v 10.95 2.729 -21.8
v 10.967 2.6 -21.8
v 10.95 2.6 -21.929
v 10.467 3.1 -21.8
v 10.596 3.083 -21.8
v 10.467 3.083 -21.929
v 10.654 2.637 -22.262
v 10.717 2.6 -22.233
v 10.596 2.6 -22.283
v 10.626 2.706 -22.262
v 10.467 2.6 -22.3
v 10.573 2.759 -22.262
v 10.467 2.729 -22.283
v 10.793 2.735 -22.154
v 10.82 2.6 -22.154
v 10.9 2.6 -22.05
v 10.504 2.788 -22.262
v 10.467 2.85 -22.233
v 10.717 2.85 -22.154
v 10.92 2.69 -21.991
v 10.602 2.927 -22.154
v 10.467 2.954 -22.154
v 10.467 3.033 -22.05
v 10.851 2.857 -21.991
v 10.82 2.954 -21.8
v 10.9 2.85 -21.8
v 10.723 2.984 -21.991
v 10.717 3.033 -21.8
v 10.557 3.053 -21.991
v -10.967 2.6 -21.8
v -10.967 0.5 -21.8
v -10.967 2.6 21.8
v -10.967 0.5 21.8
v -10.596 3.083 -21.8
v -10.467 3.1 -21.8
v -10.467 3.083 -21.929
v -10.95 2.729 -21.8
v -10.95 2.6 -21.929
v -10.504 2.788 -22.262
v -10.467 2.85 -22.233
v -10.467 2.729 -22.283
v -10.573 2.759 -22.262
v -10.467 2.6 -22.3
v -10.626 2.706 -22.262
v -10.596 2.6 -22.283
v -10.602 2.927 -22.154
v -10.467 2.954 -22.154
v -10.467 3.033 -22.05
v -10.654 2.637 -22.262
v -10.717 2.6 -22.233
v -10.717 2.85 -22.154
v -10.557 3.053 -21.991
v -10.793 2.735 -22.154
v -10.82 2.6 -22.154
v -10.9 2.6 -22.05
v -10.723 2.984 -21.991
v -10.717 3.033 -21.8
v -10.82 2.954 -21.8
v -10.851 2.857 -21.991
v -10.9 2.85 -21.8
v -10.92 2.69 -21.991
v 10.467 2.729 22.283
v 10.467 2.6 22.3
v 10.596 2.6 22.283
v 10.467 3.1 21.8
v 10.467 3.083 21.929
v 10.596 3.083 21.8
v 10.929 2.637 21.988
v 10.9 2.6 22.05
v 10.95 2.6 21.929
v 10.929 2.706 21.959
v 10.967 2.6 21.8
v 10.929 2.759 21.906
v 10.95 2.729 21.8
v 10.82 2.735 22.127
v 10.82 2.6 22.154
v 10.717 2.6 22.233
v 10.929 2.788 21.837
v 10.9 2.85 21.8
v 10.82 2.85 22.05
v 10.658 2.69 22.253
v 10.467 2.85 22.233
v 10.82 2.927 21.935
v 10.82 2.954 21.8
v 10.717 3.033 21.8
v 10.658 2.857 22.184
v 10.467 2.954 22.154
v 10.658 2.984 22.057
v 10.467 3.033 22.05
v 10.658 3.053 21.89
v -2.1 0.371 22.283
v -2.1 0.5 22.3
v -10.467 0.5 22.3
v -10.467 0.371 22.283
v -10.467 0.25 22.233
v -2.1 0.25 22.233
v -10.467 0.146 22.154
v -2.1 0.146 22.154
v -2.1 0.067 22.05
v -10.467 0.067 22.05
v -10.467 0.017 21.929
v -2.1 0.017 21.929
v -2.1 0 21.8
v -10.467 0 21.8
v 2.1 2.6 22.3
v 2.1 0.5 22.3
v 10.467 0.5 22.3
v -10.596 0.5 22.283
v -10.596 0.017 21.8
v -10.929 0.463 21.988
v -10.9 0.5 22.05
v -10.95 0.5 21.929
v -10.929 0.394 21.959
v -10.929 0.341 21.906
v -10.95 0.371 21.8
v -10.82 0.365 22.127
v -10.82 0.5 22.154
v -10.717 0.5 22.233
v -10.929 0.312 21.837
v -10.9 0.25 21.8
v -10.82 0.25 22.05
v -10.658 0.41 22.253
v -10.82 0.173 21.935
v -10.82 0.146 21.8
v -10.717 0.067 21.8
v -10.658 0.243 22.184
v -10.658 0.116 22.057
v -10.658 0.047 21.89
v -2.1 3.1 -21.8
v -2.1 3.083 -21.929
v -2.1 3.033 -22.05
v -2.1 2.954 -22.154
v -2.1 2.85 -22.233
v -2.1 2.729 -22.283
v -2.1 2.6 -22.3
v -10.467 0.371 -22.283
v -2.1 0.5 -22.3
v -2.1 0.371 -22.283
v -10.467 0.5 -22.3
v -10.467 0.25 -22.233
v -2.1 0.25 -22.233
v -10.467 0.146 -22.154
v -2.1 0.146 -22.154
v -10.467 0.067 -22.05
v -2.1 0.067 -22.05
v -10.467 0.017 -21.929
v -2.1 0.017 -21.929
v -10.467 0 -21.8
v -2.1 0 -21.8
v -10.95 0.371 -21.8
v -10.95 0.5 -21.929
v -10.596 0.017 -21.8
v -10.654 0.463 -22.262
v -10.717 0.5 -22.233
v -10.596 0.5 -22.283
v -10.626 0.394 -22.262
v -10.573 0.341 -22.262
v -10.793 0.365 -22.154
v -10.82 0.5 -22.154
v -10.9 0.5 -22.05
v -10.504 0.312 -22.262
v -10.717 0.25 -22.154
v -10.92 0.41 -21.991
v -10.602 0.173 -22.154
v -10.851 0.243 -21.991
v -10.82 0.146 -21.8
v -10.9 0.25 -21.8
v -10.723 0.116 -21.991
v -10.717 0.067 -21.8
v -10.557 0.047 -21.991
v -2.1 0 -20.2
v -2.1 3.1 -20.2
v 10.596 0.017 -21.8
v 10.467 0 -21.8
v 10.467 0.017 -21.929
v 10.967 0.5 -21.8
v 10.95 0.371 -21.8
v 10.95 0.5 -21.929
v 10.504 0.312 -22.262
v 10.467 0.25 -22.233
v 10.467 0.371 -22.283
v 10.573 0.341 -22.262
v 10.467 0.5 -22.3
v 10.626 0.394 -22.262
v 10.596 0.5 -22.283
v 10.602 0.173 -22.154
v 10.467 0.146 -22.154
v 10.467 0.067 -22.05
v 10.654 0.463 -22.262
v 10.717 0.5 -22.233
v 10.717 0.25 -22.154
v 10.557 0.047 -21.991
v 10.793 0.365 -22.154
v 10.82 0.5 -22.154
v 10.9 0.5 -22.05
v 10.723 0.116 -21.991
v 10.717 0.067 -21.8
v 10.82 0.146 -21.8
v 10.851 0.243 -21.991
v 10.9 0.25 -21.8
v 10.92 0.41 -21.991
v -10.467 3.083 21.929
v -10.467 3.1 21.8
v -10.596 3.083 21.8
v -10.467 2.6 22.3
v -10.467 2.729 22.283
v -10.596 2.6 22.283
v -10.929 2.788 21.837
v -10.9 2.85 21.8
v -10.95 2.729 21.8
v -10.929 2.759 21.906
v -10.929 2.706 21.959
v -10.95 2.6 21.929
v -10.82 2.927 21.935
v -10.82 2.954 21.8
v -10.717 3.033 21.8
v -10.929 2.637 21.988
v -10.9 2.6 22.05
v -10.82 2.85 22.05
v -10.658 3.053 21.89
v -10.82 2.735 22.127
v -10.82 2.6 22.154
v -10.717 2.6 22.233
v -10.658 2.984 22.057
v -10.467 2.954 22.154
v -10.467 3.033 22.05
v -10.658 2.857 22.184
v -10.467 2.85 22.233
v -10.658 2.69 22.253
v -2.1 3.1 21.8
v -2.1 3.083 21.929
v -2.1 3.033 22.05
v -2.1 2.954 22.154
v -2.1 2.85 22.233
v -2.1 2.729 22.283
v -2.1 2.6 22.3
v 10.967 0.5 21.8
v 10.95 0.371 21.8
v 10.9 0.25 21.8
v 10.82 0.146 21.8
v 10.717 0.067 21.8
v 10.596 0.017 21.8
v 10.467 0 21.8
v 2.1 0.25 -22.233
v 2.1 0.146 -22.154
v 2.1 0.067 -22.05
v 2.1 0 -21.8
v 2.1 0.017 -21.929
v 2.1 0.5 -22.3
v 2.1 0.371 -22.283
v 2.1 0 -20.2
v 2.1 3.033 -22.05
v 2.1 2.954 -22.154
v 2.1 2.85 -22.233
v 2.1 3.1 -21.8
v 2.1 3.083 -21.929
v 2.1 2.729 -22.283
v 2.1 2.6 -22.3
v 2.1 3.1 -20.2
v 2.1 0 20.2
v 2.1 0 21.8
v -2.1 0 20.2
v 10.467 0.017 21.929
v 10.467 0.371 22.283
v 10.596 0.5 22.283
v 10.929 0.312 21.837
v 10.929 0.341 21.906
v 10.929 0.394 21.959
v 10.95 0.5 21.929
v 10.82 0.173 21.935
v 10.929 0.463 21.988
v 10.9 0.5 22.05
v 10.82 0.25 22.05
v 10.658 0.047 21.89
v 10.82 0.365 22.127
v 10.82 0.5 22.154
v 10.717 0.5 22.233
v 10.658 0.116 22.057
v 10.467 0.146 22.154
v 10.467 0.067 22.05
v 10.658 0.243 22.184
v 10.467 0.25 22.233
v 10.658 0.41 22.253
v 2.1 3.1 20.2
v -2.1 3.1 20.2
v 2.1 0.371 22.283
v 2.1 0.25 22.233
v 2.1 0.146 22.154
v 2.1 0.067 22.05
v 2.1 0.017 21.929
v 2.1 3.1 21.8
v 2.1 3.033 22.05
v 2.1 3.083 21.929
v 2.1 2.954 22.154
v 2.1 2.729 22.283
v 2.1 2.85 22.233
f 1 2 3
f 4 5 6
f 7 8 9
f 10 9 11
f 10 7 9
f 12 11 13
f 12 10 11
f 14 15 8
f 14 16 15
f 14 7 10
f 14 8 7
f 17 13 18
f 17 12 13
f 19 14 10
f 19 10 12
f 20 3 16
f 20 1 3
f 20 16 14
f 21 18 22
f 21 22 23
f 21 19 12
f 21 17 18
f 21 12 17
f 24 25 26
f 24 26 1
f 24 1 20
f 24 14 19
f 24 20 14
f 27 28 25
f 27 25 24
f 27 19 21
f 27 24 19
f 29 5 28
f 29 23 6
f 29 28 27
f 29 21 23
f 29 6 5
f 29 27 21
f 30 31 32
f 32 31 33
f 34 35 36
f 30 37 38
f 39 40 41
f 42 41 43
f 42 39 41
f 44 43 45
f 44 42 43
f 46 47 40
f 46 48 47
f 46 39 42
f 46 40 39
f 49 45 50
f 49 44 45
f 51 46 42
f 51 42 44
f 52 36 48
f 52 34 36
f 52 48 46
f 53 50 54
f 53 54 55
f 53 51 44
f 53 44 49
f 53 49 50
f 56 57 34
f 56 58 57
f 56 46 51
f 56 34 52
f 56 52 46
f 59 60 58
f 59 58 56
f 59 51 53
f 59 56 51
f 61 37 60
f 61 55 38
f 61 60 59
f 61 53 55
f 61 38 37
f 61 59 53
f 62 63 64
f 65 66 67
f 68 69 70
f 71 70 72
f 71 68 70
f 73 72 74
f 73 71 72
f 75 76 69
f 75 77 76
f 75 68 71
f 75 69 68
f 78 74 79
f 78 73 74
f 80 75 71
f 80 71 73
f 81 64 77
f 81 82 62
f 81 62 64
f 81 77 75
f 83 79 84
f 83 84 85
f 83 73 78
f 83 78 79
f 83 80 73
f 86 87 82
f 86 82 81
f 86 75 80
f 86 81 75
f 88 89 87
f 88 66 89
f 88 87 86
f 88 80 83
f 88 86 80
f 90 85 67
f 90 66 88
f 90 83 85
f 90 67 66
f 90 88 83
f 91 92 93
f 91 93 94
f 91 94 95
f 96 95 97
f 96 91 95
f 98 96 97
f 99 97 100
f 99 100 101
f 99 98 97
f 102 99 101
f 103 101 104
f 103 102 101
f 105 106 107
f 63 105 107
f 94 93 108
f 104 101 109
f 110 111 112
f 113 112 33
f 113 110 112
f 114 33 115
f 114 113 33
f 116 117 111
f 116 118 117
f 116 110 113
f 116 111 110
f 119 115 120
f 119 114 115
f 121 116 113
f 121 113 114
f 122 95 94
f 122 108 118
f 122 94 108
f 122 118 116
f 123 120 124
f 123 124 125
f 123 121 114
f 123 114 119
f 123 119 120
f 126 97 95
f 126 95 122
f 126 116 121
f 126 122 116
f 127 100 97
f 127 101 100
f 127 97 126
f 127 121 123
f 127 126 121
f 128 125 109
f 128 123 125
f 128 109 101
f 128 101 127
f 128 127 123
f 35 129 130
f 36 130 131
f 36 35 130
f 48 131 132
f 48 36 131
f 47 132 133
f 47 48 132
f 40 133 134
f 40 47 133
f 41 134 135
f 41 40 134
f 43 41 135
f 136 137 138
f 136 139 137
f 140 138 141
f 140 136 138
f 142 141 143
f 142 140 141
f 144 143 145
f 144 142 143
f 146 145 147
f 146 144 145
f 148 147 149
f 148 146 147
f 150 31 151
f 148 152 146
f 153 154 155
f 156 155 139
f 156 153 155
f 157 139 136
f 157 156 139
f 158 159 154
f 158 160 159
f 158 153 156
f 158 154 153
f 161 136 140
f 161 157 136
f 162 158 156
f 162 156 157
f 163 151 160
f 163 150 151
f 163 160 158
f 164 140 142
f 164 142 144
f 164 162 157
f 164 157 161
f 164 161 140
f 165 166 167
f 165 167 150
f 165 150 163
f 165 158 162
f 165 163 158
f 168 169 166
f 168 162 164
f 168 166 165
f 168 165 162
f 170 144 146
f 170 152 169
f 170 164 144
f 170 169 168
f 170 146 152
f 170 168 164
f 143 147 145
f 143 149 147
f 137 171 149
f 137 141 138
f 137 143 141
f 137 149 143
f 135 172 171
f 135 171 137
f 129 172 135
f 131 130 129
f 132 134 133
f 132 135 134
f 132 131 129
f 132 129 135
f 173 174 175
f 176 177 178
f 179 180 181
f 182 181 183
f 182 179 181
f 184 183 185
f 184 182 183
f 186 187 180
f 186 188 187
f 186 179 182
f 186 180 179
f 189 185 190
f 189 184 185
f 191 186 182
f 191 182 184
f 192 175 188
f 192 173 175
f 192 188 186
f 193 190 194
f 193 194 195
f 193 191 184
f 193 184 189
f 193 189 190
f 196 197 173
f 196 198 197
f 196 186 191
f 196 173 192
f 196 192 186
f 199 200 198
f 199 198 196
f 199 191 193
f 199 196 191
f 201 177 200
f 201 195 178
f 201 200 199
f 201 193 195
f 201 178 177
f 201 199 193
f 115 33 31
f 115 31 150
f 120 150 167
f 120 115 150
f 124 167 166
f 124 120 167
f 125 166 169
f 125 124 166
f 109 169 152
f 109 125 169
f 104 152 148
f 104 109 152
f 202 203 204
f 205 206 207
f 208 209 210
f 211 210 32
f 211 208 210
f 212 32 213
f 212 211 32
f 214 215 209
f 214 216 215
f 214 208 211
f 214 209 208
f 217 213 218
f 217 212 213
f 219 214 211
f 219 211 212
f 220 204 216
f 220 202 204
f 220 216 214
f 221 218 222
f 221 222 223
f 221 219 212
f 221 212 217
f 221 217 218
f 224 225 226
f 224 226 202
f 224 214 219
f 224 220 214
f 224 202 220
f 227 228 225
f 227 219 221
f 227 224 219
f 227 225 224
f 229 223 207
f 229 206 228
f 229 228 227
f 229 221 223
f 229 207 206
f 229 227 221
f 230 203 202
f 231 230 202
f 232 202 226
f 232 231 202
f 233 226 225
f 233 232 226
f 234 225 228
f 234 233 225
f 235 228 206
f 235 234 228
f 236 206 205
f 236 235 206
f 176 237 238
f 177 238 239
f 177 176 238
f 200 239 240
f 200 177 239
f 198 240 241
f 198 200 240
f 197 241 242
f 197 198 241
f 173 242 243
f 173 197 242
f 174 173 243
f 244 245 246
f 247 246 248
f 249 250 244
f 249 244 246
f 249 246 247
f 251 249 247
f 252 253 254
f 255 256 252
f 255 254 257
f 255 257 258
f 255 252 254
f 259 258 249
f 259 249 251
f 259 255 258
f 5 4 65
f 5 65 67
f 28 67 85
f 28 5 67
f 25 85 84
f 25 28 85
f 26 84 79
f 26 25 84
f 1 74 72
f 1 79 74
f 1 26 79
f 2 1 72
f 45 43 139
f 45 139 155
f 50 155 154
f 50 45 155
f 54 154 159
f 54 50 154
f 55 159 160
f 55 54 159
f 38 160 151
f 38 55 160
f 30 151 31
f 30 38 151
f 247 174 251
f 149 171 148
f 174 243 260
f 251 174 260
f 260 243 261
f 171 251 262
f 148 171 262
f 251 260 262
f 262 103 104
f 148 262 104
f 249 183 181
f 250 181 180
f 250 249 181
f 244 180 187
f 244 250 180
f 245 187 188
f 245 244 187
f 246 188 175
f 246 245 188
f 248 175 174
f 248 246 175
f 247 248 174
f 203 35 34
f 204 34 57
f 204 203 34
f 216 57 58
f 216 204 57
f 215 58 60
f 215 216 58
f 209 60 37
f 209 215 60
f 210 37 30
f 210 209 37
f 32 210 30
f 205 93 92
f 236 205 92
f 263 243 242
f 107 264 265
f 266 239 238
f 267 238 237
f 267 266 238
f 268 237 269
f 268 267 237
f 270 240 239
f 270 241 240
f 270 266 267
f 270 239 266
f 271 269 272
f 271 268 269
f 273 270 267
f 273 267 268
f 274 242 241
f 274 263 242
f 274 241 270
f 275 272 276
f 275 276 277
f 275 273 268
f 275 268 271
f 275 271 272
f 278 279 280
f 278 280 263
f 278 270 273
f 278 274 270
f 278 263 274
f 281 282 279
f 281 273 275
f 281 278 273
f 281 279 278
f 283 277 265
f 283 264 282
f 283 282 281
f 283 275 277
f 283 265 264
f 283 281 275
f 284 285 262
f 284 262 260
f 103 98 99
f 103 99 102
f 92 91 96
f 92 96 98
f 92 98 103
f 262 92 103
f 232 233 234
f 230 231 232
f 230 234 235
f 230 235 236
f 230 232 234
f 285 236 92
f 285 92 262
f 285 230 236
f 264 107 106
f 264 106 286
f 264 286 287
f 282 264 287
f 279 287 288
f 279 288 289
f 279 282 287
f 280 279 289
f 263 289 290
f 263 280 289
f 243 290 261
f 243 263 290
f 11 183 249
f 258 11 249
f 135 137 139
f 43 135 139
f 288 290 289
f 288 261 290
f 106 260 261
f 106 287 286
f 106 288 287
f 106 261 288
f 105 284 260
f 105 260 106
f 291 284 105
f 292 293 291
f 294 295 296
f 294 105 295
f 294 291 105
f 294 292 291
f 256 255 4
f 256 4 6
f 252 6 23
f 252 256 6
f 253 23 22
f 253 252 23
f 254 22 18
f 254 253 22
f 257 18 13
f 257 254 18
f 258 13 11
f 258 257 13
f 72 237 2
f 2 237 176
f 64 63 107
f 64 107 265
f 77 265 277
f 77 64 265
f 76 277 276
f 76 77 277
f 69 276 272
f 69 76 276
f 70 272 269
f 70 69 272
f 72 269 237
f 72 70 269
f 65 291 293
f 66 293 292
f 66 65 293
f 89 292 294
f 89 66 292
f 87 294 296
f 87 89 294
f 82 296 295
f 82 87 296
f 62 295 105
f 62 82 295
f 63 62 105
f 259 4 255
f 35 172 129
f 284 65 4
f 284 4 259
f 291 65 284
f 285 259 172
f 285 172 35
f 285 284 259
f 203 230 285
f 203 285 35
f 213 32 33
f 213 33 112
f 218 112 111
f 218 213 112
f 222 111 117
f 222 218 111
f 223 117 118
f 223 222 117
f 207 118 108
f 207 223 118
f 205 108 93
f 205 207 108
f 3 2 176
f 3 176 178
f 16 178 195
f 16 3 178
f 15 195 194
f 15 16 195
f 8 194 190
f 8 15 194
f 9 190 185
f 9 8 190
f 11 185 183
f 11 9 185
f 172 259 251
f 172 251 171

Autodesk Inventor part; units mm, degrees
ref_plane "Плоскость YZ" through (0, 0, 0) normal (1, 0, 0) x (0, 1, 0)
ref_plane "Плоскость XZ" through (0, 0, 0) normal (0, 1, 0) x (-1, 0, 0)
ref_plane "Плоскость XY" through (0, 0, 0) normal (0, 0, 1) x (1, 0, 0)
sketch "Эскиз1" plane through (0, 0, 0) normal (0, 1, 0) x (-1, 0, 0)
  line L0 (10.9667, 22.3) -> (-10.9667, 22.3)
  line L1 (-10.9667, 22.3) -> (-10.9667, -22.3)
  line L2 (-10.9667, -22.3) -> (10.9667, -22.3)
  line L3 (10.9667, -22.3) -> (10.9667, 22.3)
  line L4 (10.9667, 22.3) -> (-10.9667, -22.3) construction
  line L5 (-10.9667, 22.3) -> (10.9667, -22.3) construction
  point P0 (0, 0)
  dimension "d0" = 44.6
  dimension "d1" = 21.9333
extrude "Выдавливание1" add sketch "Эскиз1" along normal blind 3.1
fillet "Сопряжение1" radius 0.5 12 edges at (0, 3.1, 22.3) (0, 0, 22.3) (10.9667, 1.55, 22.3) (-10.9667, 1.55, 22.3) (-10.9667, 3.1, 0) (10.9667, 3.1, 0) (10.9667, 0, 0) (-10.9667, 0, 0) (0, 3.1, -22.3) (0, 0, -22.3) (-10.9667, 1.55, -22.3) (10.9667, 1.55, -22.3)
sketch "Эскиз2" plane through (0, 3.1, 0) normal (0, 1, 0) x (1, 0, 0)
  line L0 (-2.1, 24.4) -> (2.1, 24.4)
  line L1 (2.1, 24.4) -> (2.1, 20.2)
  line L2 (2.1, 20.2) -> (-2.1, 20.2)
  line L3 (-2.1, 20.2) -> (-2.1, 24.4)
  line L4 (10.4667, 22.3) -> (-10.4667, 22.3) projected
  line L5 (-2.1, 24.4) -> (2.1, 20.2) construction
  line L6 (2.1, 24.4) -> (-2.1, 20.2) construction
  point P0 (0, 0)
  point P1 (0, 22.3)
  dimension "d5" = 4.2
  dimension "d6" = 4.2
extrude "Выдавливание2" cut sketch "Эскиз2" against normal blind 10
mirror "Зеркальное отражение1" about plane through (0, 0, 0) normal (0, 0, 1) of "Выдавливание2"
properties part number "Test2" material "Типовой"
